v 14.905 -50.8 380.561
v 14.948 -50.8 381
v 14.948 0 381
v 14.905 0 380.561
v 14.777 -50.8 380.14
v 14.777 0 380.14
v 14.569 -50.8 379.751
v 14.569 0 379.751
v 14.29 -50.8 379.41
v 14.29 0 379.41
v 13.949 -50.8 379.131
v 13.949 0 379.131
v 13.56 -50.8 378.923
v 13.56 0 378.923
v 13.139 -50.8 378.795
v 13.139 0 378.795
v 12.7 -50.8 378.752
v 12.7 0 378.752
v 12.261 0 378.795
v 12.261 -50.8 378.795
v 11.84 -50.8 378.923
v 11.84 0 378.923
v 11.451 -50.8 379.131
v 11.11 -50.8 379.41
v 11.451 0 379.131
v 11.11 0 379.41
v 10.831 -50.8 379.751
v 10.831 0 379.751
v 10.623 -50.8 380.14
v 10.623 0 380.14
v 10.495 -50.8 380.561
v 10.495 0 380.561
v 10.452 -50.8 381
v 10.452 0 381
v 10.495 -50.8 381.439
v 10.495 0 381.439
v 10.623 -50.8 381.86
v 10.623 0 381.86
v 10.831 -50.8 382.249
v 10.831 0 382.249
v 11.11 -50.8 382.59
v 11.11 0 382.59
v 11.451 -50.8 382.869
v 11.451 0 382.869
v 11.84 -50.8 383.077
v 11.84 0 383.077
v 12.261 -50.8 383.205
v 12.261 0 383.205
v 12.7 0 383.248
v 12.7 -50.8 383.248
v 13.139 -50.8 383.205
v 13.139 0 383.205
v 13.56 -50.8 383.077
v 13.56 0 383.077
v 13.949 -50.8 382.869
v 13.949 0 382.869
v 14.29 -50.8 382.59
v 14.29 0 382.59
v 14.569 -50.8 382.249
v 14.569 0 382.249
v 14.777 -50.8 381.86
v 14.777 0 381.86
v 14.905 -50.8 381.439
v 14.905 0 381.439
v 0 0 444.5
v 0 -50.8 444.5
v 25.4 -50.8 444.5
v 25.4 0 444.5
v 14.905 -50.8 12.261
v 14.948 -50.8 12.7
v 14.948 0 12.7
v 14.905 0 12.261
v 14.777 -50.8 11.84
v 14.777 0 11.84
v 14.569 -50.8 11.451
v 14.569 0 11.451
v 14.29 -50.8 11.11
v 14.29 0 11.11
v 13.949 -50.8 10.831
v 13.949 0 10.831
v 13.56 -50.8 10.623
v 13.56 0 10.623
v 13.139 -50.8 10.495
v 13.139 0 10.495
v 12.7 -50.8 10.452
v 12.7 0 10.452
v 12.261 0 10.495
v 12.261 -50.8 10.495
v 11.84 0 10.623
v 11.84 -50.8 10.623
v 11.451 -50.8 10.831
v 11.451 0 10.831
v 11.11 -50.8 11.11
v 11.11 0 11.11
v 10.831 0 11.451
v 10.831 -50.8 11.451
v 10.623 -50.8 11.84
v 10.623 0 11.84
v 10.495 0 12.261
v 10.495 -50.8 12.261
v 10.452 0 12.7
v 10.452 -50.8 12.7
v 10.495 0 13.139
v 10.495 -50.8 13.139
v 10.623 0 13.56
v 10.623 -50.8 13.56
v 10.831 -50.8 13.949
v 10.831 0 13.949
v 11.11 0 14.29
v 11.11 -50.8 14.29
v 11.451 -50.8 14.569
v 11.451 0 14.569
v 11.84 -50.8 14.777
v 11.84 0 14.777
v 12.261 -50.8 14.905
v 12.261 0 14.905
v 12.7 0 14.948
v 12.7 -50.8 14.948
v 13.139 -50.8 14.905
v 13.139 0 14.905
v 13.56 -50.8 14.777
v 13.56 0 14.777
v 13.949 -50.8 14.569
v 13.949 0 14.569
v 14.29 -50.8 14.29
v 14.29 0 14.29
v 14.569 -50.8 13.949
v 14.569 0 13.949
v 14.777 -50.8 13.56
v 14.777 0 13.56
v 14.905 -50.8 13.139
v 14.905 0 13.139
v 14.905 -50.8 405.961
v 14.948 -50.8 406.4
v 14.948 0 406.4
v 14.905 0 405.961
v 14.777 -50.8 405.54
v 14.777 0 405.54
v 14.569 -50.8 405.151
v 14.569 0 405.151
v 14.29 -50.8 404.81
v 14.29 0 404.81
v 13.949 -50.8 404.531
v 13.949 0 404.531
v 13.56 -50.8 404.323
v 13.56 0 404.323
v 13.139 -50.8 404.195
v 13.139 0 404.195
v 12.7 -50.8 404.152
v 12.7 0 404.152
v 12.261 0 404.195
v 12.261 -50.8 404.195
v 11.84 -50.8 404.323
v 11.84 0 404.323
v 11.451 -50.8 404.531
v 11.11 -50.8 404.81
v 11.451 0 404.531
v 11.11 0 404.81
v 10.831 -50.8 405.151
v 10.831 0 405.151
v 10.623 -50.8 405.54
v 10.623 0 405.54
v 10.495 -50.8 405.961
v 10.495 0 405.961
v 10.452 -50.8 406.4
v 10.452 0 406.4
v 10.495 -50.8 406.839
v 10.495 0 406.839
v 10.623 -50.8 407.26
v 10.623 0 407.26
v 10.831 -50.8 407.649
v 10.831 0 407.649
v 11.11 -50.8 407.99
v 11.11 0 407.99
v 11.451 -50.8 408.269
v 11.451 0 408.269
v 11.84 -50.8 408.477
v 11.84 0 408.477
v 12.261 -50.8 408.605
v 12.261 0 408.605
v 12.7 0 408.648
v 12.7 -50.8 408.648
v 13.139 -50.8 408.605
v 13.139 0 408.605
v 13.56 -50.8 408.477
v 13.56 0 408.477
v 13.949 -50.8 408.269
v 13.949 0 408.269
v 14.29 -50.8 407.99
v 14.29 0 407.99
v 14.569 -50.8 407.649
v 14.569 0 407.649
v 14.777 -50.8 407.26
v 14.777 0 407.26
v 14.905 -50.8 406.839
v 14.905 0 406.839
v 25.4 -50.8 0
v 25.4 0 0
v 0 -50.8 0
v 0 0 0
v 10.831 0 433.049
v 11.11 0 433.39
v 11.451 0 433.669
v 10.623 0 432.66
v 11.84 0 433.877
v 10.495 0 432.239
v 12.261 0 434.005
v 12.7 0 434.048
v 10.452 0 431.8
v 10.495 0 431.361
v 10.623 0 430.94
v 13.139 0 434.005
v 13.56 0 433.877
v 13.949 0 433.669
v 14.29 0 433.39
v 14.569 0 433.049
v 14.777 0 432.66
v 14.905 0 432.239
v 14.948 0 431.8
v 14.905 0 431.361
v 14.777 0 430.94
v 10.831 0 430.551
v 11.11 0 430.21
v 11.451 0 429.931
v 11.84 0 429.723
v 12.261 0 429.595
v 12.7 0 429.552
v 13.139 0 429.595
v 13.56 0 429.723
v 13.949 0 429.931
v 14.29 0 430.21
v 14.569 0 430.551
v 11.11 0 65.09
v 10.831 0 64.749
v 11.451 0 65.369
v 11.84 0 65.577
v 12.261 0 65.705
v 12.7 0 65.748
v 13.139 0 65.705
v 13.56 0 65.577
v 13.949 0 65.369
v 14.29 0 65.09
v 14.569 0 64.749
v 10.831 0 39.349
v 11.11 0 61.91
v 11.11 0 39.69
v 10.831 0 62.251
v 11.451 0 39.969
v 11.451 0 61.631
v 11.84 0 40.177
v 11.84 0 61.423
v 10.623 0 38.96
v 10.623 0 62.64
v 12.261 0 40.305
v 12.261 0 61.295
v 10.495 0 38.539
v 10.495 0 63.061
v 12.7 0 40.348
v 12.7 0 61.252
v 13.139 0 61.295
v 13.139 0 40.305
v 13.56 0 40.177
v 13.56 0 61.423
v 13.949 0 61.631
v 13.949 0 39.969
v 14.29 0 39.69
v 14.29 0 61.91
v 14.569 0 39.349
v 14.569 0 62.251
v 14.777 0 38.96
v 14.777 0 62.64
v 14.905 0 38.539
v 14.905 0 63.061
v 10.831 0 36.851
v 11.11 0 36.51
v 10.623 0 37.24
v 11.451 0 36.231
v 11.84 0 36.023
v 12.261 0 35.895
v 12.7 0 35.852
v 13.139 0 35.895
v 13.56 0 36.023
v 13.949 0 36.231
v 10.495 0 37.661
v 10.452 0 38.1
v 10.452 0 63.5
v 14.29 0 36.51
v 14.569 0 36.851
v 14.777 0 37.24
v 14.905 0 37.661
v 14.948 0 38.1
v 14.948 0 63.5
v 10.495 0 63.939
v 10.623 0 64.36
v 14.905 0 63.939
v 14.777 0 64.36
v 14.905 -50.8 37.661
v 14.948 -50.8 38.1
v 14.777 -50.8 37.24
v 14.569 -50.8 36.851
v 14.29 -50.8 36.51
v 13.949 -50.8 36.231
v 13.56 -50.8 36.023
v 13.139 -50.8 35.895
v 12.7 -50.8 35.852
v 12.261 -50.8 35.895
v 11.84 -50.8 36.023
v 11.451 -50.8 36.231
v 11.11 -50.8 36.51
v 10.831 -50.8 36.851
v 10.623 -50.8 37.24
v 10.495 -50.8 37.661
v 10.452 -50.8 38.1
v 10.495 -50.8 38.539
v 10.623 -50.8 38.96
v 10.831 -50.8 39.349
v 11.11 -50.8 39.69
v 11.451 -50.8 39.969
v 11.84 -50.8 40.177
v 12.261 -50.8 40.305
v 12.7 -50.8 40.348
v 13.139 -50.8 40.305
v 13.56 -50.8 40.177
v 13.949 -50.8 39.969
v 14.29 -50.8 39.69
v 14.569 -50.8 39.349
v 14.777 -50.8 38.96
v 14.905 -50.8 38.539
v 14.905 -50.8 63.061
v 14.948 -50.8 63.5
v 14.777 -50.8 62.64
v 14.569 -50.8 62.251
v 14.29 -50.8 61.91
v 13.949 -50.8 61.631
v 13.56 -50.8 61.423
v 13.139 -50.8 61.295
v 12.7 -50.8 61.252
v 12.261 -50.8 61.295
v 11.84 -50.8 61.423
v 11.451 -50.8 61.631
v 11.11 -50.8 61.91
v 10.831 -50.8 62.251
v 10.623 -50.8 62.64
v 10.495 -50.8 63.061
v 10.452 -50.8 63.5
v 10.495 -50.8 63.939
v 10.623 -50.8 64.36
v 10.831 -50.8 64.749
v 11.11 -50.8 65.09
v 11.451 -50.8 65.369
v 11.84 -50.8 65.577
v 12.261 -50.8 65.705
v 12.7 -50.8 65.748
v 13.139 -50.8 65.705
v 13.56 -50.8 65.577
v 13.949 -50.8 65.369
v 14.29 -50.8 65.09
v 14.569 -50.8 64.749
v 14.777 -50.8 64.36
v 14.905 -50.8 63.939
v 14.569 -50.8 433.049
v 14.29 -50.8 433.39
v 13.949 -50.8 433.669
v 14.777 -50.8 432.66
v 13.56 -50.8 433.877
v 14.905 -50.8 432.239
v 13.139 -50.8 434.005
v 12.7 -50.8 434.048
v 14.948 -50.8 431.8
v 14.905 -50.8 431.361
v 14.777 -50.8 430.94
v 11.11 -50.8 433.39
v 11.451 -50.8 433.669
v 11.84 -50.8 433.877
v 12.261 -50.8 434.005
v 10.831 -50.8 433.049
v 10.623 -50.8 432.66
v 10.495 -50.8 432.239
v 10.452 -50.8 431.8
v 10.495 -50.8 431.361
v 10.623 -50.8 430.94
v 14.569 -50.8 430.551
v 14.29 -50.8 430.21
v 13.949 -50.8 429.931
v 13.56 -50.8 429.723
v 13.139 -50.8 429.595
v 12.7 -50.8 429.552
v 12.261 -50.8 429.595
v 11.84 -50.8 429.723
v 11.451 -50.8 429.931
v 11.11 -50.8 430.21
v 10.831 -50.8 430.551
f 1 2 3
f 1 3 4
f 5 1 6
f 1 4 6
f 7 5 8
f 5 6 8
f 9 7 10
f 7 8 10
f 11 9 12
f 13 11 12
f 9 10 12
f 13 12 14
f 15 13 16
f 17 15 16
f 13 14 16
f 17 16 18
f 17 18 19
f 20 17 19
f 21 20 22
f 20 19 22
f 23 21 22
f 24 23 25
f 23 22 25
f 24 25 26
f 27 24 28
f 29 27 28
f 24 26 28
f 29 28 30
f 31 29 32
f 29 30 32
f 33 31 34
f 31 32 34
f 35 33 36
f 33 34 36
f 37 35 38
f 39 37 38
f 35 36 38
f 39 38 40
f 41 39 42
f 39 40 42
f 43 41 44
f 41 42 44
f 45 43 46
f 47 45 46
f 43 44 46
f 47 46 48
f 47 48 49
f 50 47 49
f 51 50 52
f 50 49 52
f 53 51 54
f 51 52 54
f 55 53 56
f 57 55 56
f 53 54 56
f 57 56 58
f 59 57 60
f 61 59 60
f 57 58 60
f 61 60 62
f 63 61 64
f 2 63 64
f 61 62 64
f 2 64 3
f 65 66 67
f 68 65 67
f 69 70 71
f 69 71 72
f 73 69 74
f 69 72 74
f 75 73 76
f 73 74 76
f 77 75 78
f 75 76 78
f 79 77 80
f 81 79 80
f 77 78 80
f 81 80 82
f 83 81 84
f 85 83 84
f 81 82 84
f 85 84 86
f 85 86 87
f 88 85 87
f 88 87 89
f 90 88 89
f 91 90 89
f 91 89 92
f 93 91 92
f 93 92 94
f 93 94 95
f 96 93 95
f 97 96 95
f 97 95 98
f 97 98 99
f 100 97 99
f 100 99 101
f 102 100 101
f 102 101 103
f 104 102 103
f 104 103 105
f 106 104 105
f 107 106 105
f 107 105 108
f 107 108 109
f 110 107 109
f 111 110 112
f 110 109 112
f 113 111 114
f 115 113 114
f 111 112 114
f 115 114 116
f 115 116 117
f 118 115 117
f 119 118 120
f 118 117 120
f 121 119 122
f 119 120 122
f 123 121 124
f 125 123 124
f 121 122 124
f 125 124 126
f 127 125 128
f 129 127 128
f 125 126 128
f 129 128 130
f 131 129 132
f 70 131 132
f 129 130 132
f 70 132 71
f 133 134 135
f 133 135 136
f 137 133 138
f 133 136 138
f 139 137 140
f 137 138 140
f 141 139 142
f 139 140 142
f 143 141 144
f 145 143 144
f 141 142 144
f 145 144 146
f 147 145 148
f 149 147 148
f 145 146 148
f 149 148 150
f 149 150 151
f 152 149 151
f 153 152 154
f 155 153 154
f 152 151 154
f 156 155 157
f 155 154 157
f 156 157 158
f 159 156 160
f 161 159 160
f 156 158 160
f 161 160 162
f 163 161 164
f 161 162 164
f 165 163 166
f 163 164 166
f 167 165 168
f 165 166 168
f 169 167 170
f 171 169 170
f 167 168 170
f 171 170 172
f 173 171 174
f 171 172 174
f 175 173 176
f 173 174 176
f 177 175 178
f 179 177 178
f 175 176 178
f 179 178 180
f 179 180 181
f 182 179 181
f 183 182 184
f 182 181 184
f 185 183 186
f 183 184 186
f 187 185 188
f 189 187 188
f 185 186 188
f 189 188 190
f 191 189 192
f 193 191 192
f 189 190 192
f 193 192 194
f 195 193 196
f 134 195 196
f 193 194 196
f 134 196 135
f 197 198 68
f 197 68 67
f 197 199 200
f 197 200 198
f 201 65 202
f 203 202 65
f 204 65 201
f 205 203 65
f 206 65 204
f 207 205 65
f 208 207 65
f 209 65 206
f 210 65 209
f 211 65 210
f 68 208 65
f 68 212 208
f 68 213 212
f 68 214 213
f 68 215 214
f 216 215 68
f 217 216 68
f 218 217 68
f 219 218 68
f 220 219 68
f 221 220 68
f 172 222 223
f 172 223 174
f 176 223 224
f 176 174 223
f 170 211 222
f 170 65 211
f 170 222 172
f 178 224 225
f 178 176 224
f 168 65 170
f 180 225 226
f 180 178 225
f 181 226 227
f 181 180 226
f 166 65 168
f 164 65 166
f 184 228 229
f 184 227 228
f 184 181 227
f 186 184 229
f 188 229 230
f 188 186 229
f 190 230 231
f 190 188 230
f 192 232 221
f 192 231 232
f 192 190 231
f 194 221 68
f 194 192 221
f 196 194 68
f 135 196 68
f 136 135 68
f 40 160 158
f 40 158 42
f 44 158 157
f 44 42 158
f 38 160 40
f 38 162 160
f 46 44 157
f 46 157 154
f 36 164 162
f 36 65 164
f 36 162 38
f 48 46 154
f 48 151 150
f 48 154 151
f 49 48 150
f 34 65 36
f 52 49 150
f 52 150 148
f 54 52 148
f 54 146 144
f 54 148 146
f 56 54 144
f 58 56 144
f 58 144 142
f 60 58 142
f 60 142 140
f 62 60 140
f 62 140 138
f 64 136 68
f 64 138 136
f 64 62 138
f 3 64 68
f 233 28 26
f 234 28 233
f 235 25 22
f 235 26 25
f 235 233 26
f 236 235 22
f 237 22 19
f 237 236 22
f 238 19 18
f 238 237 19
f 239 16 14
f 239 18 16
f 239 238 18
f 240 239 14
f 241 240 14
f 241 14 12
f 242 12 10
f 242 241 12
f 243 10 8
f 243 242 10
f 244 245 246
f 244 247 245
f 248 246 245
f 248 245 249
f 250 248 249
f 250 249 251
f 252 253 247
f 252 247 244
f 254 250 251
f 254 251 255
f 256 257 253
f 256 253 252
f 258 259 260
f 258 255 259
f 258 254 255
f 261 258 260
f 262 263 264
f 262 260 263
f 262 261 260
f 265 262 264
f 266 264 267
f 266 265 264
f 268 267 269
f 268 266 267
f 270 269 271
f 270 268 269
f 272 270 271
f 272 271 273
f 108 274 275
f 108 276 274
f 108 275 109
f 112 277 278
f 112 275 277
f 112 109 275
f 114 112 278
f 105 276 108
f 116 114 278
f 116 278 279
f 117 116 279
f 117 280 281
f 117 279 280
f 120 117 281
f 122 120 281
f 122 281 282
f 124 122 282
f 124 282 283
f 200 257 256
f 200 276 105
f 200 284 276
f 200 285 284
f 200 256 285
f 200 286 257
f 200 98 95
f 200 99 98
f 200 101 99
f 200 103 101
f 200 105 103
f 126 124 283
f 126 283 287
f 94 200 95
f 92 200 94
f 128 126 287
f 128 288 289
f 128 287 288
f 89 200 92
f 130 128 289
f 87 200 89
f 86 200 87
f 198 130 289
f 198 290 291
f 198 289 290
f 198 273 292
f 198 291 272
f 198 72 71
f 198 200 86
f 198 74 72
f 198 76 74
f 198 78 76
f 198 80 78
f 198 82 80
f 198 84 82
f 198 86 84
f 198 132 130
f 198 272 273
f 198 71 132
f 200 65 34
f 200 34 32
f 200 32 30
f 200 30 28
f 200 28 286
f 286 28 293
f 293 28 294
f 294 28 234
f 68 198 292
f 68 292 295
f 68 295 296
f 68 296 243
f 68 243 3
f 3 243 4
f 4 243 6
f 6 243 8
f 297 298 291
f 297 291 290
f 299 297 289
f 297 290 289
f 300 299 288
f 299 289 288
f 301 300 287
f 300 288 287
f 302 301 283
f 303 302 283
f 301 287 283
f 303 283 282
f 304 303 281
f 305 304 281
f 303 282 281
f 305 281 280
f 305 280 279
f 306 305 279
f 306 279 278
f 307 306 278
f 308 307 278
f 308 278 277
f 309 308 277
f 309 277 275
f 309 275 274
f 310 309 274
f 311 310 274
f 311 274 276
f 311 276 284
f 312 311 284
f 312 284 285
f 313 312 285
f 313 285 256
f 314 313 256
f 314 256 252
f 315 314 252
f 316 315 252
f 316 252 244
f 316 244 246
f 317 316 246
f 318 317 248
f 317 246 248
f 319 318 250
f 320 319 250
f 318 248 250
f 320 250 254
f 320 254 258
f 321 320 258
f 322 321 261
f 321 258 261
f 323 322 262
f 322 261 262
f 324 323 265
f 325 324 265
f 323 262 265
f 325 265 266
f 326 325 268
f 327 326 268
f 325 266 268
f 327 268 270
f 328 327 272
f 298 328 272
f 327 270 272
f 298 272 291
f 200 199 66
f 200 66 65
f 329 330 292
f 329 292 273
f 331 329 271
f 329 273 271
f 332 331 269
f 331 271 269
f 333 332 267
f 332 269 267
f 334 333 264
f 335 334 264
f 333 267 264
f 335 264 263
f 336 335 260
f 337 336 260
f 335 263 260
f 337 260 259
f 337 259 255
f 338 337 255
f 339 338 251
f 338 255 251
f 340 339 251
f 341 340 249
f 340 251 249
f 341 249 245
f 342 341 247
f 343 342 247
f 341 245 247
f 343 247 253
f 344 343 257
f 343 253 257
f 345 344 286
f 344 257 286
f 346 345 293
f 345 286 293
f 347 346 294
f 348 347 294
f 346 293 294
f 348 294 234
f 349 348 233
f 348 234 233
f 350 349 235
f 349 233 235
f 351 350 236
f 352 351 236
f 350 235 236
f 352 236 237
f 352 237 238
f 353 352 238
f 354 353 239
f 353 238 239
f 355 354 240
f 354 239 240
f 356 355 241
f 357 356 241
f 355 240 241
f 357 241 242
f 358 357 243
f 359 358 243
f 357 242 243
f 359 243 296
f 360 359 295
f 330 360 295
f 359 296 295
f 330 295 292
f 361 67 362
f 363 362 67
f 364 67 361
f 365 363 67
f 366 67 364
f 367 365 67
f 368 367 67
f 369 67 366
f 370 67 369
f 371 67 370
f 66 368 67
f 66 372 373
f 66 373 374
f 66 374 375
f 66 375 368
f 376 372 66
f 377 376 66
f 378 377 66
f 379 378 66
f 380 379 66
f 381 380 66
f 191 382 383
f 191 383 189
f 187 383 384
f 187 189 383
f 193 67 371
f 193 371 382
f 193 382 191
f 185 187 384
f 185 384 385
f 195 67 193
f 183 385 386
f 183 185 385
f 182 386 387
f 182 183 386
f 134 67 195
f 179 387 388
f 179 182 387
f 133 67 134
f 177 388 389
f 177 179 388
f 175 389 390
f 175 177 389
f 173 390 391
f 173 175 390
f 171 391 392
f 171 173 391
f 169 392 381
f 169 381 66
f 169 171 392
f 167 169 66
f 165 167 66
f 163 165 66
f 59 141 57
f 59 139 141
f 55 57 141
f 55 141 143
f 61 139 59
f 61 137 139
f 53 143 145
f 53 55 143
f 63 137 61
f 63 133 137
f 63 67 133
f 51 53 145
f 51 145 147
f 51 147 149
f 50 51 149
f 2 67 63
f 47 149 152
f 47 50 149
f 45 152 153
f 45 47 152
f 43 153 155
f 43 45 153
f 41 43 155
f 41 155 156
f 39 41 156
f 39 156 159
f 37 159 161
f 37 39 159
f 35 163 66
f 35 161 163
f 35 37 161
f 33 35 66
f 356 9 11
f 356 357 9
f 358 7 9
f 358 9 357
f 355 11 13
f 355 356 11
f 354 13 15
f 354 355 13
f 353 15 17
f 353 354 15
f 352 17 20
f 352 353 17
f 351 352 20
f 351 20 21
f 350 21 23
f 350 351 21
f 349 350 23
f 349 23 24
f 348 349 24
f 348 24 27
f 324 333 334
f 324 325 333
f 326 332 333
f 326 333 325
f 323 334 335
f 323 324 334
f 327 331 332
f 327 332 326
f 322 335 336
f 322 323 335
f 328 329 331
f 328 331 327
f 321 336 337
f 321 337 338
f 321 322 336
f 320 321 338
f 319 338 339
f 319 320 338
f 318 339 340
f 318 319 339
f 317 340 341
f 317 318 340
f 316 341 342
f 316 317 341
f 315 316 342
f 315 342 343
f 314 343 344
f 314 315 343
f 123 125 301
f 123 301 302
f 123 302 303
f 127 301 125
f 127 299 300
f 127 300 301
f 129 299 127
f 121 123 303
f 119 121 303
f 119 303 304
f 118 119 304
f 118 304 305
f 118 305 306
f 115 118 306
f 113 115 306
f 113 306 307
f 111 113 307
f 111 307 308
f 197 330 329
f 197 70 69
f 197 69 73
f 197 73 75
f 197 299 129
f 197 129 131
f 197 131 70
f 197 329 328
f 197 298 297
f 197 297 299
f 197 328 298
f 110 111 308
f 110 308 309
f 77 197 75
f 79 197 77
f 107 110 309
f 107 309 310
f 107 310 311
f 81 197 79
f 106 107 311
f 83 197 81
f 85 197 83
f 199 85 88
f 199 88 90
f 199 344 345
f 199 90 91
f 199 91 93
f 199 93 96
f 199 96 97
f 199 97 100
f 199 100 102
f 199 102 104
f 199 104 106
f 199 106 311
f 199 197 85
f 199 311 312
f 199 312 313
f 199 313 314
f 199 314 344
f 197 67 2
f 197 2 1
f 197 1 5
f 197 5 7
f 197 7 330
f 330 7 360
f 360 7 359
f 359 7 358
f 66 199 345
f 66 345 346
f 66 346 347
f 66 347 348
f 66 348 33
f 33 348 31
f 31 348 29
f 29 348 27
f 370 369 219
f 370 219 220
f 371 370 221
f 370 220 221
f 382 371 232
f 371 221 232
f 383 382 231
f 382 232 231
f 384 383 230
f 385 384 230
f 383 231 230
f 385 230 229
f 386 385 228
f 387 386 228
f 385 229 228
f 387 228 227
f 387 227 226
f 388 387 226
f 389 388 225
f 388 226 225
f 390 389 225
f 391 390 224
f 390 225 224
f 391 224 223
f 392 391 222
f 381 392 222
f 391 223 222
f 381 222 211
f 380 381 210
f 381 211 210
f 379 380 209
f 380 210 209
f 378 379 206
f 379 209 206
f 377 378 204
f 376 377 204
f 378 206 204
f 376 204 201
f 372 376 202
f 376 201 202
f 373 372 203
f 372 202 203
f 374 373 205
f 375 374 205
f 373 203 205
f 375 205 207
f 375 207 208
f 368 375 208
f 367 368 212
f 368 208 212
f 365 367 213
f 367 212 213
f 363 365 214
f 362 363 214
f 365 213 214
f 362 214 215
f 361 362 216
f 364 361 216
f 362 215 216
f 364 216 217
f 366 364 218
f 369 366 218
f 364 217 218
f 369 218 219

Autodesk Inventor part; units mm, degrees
ref_plane "YZ Plane" through (0, 0, 0) normal (1, 0, 0) x (0, 1, 0)
ref_plane "XZ Plane" through (0, 0, 0) normal (0, 1, 0) x (-1, 0, 0)
ref_plane "XY Plane" through (0, 0, 0) normal (0, 0, 1) x (1, 0, 0)
sketch "Sketch2" plane through (0, 0, 0) normal (0, 0, 1) x (1, 0, 0)
  line L0 (0, 0) -> (25.4, 0)
  line L1 (25.4, 0) -> (25.4, -50.8)
  line L2 (25.4, -50.8) -> (0, -50.8)
  line L3 (0, -50.8) -> (0, 0)
  dimension "d4" = 25.4
  dimension "d5" = 50.8
extrude "Extrusion2" add sketch "Sketch2" along normal blind 444.5
sketch "Sketch3" plane through (0, 0, 0) normal (0, 1, 0) x (1, 0, 0)
  circle A0 centre (12.7, -431.8) radius 2.2479
  line L0 (0, 0) -> (0, -444.5) projected
  line L1 (25.4, -444.5) -> (0, -444.5) projected
  circle A1 centre (12.7, -406.4) radius 2.2479
  circle A2 centre (12.7, -381) radius 2.2479
  dimension "d8" = 4.4958
  dimension "d9" = 12.7
  dimension "d10" = 12.7
  dimension "d13" = 25.4
extrude "Extrusion3" cut sketch "Sketch3" against normal blind 609.6
sketch "Sketch4" plane through (0, 0, 0) normal (0, 1, 0) x (1, 0, 0)
  circle A0 centre (12.7, -12.7) radius 2.2479
  line L0 (25.4, 0) -> (0, 0) projected
  line L1 (25.4, 0) -> (25.4, -444.5) projected
  circle A1 centre (12.7, -38.1) radius 2.2479
  circle A2 centre (12.7, -63.5) radius 2.2479
  dimension "d20" = 4.4958
  dimension "d21" = 12.7
  dimension "d22" = 12.7
  dimension "d25" = 25.4
extrude "Extrusion4" cut sketch "Sketch4" against normal blind 609.6
properties part number "Chassis Bar" material "Polyethylene, High Density"
